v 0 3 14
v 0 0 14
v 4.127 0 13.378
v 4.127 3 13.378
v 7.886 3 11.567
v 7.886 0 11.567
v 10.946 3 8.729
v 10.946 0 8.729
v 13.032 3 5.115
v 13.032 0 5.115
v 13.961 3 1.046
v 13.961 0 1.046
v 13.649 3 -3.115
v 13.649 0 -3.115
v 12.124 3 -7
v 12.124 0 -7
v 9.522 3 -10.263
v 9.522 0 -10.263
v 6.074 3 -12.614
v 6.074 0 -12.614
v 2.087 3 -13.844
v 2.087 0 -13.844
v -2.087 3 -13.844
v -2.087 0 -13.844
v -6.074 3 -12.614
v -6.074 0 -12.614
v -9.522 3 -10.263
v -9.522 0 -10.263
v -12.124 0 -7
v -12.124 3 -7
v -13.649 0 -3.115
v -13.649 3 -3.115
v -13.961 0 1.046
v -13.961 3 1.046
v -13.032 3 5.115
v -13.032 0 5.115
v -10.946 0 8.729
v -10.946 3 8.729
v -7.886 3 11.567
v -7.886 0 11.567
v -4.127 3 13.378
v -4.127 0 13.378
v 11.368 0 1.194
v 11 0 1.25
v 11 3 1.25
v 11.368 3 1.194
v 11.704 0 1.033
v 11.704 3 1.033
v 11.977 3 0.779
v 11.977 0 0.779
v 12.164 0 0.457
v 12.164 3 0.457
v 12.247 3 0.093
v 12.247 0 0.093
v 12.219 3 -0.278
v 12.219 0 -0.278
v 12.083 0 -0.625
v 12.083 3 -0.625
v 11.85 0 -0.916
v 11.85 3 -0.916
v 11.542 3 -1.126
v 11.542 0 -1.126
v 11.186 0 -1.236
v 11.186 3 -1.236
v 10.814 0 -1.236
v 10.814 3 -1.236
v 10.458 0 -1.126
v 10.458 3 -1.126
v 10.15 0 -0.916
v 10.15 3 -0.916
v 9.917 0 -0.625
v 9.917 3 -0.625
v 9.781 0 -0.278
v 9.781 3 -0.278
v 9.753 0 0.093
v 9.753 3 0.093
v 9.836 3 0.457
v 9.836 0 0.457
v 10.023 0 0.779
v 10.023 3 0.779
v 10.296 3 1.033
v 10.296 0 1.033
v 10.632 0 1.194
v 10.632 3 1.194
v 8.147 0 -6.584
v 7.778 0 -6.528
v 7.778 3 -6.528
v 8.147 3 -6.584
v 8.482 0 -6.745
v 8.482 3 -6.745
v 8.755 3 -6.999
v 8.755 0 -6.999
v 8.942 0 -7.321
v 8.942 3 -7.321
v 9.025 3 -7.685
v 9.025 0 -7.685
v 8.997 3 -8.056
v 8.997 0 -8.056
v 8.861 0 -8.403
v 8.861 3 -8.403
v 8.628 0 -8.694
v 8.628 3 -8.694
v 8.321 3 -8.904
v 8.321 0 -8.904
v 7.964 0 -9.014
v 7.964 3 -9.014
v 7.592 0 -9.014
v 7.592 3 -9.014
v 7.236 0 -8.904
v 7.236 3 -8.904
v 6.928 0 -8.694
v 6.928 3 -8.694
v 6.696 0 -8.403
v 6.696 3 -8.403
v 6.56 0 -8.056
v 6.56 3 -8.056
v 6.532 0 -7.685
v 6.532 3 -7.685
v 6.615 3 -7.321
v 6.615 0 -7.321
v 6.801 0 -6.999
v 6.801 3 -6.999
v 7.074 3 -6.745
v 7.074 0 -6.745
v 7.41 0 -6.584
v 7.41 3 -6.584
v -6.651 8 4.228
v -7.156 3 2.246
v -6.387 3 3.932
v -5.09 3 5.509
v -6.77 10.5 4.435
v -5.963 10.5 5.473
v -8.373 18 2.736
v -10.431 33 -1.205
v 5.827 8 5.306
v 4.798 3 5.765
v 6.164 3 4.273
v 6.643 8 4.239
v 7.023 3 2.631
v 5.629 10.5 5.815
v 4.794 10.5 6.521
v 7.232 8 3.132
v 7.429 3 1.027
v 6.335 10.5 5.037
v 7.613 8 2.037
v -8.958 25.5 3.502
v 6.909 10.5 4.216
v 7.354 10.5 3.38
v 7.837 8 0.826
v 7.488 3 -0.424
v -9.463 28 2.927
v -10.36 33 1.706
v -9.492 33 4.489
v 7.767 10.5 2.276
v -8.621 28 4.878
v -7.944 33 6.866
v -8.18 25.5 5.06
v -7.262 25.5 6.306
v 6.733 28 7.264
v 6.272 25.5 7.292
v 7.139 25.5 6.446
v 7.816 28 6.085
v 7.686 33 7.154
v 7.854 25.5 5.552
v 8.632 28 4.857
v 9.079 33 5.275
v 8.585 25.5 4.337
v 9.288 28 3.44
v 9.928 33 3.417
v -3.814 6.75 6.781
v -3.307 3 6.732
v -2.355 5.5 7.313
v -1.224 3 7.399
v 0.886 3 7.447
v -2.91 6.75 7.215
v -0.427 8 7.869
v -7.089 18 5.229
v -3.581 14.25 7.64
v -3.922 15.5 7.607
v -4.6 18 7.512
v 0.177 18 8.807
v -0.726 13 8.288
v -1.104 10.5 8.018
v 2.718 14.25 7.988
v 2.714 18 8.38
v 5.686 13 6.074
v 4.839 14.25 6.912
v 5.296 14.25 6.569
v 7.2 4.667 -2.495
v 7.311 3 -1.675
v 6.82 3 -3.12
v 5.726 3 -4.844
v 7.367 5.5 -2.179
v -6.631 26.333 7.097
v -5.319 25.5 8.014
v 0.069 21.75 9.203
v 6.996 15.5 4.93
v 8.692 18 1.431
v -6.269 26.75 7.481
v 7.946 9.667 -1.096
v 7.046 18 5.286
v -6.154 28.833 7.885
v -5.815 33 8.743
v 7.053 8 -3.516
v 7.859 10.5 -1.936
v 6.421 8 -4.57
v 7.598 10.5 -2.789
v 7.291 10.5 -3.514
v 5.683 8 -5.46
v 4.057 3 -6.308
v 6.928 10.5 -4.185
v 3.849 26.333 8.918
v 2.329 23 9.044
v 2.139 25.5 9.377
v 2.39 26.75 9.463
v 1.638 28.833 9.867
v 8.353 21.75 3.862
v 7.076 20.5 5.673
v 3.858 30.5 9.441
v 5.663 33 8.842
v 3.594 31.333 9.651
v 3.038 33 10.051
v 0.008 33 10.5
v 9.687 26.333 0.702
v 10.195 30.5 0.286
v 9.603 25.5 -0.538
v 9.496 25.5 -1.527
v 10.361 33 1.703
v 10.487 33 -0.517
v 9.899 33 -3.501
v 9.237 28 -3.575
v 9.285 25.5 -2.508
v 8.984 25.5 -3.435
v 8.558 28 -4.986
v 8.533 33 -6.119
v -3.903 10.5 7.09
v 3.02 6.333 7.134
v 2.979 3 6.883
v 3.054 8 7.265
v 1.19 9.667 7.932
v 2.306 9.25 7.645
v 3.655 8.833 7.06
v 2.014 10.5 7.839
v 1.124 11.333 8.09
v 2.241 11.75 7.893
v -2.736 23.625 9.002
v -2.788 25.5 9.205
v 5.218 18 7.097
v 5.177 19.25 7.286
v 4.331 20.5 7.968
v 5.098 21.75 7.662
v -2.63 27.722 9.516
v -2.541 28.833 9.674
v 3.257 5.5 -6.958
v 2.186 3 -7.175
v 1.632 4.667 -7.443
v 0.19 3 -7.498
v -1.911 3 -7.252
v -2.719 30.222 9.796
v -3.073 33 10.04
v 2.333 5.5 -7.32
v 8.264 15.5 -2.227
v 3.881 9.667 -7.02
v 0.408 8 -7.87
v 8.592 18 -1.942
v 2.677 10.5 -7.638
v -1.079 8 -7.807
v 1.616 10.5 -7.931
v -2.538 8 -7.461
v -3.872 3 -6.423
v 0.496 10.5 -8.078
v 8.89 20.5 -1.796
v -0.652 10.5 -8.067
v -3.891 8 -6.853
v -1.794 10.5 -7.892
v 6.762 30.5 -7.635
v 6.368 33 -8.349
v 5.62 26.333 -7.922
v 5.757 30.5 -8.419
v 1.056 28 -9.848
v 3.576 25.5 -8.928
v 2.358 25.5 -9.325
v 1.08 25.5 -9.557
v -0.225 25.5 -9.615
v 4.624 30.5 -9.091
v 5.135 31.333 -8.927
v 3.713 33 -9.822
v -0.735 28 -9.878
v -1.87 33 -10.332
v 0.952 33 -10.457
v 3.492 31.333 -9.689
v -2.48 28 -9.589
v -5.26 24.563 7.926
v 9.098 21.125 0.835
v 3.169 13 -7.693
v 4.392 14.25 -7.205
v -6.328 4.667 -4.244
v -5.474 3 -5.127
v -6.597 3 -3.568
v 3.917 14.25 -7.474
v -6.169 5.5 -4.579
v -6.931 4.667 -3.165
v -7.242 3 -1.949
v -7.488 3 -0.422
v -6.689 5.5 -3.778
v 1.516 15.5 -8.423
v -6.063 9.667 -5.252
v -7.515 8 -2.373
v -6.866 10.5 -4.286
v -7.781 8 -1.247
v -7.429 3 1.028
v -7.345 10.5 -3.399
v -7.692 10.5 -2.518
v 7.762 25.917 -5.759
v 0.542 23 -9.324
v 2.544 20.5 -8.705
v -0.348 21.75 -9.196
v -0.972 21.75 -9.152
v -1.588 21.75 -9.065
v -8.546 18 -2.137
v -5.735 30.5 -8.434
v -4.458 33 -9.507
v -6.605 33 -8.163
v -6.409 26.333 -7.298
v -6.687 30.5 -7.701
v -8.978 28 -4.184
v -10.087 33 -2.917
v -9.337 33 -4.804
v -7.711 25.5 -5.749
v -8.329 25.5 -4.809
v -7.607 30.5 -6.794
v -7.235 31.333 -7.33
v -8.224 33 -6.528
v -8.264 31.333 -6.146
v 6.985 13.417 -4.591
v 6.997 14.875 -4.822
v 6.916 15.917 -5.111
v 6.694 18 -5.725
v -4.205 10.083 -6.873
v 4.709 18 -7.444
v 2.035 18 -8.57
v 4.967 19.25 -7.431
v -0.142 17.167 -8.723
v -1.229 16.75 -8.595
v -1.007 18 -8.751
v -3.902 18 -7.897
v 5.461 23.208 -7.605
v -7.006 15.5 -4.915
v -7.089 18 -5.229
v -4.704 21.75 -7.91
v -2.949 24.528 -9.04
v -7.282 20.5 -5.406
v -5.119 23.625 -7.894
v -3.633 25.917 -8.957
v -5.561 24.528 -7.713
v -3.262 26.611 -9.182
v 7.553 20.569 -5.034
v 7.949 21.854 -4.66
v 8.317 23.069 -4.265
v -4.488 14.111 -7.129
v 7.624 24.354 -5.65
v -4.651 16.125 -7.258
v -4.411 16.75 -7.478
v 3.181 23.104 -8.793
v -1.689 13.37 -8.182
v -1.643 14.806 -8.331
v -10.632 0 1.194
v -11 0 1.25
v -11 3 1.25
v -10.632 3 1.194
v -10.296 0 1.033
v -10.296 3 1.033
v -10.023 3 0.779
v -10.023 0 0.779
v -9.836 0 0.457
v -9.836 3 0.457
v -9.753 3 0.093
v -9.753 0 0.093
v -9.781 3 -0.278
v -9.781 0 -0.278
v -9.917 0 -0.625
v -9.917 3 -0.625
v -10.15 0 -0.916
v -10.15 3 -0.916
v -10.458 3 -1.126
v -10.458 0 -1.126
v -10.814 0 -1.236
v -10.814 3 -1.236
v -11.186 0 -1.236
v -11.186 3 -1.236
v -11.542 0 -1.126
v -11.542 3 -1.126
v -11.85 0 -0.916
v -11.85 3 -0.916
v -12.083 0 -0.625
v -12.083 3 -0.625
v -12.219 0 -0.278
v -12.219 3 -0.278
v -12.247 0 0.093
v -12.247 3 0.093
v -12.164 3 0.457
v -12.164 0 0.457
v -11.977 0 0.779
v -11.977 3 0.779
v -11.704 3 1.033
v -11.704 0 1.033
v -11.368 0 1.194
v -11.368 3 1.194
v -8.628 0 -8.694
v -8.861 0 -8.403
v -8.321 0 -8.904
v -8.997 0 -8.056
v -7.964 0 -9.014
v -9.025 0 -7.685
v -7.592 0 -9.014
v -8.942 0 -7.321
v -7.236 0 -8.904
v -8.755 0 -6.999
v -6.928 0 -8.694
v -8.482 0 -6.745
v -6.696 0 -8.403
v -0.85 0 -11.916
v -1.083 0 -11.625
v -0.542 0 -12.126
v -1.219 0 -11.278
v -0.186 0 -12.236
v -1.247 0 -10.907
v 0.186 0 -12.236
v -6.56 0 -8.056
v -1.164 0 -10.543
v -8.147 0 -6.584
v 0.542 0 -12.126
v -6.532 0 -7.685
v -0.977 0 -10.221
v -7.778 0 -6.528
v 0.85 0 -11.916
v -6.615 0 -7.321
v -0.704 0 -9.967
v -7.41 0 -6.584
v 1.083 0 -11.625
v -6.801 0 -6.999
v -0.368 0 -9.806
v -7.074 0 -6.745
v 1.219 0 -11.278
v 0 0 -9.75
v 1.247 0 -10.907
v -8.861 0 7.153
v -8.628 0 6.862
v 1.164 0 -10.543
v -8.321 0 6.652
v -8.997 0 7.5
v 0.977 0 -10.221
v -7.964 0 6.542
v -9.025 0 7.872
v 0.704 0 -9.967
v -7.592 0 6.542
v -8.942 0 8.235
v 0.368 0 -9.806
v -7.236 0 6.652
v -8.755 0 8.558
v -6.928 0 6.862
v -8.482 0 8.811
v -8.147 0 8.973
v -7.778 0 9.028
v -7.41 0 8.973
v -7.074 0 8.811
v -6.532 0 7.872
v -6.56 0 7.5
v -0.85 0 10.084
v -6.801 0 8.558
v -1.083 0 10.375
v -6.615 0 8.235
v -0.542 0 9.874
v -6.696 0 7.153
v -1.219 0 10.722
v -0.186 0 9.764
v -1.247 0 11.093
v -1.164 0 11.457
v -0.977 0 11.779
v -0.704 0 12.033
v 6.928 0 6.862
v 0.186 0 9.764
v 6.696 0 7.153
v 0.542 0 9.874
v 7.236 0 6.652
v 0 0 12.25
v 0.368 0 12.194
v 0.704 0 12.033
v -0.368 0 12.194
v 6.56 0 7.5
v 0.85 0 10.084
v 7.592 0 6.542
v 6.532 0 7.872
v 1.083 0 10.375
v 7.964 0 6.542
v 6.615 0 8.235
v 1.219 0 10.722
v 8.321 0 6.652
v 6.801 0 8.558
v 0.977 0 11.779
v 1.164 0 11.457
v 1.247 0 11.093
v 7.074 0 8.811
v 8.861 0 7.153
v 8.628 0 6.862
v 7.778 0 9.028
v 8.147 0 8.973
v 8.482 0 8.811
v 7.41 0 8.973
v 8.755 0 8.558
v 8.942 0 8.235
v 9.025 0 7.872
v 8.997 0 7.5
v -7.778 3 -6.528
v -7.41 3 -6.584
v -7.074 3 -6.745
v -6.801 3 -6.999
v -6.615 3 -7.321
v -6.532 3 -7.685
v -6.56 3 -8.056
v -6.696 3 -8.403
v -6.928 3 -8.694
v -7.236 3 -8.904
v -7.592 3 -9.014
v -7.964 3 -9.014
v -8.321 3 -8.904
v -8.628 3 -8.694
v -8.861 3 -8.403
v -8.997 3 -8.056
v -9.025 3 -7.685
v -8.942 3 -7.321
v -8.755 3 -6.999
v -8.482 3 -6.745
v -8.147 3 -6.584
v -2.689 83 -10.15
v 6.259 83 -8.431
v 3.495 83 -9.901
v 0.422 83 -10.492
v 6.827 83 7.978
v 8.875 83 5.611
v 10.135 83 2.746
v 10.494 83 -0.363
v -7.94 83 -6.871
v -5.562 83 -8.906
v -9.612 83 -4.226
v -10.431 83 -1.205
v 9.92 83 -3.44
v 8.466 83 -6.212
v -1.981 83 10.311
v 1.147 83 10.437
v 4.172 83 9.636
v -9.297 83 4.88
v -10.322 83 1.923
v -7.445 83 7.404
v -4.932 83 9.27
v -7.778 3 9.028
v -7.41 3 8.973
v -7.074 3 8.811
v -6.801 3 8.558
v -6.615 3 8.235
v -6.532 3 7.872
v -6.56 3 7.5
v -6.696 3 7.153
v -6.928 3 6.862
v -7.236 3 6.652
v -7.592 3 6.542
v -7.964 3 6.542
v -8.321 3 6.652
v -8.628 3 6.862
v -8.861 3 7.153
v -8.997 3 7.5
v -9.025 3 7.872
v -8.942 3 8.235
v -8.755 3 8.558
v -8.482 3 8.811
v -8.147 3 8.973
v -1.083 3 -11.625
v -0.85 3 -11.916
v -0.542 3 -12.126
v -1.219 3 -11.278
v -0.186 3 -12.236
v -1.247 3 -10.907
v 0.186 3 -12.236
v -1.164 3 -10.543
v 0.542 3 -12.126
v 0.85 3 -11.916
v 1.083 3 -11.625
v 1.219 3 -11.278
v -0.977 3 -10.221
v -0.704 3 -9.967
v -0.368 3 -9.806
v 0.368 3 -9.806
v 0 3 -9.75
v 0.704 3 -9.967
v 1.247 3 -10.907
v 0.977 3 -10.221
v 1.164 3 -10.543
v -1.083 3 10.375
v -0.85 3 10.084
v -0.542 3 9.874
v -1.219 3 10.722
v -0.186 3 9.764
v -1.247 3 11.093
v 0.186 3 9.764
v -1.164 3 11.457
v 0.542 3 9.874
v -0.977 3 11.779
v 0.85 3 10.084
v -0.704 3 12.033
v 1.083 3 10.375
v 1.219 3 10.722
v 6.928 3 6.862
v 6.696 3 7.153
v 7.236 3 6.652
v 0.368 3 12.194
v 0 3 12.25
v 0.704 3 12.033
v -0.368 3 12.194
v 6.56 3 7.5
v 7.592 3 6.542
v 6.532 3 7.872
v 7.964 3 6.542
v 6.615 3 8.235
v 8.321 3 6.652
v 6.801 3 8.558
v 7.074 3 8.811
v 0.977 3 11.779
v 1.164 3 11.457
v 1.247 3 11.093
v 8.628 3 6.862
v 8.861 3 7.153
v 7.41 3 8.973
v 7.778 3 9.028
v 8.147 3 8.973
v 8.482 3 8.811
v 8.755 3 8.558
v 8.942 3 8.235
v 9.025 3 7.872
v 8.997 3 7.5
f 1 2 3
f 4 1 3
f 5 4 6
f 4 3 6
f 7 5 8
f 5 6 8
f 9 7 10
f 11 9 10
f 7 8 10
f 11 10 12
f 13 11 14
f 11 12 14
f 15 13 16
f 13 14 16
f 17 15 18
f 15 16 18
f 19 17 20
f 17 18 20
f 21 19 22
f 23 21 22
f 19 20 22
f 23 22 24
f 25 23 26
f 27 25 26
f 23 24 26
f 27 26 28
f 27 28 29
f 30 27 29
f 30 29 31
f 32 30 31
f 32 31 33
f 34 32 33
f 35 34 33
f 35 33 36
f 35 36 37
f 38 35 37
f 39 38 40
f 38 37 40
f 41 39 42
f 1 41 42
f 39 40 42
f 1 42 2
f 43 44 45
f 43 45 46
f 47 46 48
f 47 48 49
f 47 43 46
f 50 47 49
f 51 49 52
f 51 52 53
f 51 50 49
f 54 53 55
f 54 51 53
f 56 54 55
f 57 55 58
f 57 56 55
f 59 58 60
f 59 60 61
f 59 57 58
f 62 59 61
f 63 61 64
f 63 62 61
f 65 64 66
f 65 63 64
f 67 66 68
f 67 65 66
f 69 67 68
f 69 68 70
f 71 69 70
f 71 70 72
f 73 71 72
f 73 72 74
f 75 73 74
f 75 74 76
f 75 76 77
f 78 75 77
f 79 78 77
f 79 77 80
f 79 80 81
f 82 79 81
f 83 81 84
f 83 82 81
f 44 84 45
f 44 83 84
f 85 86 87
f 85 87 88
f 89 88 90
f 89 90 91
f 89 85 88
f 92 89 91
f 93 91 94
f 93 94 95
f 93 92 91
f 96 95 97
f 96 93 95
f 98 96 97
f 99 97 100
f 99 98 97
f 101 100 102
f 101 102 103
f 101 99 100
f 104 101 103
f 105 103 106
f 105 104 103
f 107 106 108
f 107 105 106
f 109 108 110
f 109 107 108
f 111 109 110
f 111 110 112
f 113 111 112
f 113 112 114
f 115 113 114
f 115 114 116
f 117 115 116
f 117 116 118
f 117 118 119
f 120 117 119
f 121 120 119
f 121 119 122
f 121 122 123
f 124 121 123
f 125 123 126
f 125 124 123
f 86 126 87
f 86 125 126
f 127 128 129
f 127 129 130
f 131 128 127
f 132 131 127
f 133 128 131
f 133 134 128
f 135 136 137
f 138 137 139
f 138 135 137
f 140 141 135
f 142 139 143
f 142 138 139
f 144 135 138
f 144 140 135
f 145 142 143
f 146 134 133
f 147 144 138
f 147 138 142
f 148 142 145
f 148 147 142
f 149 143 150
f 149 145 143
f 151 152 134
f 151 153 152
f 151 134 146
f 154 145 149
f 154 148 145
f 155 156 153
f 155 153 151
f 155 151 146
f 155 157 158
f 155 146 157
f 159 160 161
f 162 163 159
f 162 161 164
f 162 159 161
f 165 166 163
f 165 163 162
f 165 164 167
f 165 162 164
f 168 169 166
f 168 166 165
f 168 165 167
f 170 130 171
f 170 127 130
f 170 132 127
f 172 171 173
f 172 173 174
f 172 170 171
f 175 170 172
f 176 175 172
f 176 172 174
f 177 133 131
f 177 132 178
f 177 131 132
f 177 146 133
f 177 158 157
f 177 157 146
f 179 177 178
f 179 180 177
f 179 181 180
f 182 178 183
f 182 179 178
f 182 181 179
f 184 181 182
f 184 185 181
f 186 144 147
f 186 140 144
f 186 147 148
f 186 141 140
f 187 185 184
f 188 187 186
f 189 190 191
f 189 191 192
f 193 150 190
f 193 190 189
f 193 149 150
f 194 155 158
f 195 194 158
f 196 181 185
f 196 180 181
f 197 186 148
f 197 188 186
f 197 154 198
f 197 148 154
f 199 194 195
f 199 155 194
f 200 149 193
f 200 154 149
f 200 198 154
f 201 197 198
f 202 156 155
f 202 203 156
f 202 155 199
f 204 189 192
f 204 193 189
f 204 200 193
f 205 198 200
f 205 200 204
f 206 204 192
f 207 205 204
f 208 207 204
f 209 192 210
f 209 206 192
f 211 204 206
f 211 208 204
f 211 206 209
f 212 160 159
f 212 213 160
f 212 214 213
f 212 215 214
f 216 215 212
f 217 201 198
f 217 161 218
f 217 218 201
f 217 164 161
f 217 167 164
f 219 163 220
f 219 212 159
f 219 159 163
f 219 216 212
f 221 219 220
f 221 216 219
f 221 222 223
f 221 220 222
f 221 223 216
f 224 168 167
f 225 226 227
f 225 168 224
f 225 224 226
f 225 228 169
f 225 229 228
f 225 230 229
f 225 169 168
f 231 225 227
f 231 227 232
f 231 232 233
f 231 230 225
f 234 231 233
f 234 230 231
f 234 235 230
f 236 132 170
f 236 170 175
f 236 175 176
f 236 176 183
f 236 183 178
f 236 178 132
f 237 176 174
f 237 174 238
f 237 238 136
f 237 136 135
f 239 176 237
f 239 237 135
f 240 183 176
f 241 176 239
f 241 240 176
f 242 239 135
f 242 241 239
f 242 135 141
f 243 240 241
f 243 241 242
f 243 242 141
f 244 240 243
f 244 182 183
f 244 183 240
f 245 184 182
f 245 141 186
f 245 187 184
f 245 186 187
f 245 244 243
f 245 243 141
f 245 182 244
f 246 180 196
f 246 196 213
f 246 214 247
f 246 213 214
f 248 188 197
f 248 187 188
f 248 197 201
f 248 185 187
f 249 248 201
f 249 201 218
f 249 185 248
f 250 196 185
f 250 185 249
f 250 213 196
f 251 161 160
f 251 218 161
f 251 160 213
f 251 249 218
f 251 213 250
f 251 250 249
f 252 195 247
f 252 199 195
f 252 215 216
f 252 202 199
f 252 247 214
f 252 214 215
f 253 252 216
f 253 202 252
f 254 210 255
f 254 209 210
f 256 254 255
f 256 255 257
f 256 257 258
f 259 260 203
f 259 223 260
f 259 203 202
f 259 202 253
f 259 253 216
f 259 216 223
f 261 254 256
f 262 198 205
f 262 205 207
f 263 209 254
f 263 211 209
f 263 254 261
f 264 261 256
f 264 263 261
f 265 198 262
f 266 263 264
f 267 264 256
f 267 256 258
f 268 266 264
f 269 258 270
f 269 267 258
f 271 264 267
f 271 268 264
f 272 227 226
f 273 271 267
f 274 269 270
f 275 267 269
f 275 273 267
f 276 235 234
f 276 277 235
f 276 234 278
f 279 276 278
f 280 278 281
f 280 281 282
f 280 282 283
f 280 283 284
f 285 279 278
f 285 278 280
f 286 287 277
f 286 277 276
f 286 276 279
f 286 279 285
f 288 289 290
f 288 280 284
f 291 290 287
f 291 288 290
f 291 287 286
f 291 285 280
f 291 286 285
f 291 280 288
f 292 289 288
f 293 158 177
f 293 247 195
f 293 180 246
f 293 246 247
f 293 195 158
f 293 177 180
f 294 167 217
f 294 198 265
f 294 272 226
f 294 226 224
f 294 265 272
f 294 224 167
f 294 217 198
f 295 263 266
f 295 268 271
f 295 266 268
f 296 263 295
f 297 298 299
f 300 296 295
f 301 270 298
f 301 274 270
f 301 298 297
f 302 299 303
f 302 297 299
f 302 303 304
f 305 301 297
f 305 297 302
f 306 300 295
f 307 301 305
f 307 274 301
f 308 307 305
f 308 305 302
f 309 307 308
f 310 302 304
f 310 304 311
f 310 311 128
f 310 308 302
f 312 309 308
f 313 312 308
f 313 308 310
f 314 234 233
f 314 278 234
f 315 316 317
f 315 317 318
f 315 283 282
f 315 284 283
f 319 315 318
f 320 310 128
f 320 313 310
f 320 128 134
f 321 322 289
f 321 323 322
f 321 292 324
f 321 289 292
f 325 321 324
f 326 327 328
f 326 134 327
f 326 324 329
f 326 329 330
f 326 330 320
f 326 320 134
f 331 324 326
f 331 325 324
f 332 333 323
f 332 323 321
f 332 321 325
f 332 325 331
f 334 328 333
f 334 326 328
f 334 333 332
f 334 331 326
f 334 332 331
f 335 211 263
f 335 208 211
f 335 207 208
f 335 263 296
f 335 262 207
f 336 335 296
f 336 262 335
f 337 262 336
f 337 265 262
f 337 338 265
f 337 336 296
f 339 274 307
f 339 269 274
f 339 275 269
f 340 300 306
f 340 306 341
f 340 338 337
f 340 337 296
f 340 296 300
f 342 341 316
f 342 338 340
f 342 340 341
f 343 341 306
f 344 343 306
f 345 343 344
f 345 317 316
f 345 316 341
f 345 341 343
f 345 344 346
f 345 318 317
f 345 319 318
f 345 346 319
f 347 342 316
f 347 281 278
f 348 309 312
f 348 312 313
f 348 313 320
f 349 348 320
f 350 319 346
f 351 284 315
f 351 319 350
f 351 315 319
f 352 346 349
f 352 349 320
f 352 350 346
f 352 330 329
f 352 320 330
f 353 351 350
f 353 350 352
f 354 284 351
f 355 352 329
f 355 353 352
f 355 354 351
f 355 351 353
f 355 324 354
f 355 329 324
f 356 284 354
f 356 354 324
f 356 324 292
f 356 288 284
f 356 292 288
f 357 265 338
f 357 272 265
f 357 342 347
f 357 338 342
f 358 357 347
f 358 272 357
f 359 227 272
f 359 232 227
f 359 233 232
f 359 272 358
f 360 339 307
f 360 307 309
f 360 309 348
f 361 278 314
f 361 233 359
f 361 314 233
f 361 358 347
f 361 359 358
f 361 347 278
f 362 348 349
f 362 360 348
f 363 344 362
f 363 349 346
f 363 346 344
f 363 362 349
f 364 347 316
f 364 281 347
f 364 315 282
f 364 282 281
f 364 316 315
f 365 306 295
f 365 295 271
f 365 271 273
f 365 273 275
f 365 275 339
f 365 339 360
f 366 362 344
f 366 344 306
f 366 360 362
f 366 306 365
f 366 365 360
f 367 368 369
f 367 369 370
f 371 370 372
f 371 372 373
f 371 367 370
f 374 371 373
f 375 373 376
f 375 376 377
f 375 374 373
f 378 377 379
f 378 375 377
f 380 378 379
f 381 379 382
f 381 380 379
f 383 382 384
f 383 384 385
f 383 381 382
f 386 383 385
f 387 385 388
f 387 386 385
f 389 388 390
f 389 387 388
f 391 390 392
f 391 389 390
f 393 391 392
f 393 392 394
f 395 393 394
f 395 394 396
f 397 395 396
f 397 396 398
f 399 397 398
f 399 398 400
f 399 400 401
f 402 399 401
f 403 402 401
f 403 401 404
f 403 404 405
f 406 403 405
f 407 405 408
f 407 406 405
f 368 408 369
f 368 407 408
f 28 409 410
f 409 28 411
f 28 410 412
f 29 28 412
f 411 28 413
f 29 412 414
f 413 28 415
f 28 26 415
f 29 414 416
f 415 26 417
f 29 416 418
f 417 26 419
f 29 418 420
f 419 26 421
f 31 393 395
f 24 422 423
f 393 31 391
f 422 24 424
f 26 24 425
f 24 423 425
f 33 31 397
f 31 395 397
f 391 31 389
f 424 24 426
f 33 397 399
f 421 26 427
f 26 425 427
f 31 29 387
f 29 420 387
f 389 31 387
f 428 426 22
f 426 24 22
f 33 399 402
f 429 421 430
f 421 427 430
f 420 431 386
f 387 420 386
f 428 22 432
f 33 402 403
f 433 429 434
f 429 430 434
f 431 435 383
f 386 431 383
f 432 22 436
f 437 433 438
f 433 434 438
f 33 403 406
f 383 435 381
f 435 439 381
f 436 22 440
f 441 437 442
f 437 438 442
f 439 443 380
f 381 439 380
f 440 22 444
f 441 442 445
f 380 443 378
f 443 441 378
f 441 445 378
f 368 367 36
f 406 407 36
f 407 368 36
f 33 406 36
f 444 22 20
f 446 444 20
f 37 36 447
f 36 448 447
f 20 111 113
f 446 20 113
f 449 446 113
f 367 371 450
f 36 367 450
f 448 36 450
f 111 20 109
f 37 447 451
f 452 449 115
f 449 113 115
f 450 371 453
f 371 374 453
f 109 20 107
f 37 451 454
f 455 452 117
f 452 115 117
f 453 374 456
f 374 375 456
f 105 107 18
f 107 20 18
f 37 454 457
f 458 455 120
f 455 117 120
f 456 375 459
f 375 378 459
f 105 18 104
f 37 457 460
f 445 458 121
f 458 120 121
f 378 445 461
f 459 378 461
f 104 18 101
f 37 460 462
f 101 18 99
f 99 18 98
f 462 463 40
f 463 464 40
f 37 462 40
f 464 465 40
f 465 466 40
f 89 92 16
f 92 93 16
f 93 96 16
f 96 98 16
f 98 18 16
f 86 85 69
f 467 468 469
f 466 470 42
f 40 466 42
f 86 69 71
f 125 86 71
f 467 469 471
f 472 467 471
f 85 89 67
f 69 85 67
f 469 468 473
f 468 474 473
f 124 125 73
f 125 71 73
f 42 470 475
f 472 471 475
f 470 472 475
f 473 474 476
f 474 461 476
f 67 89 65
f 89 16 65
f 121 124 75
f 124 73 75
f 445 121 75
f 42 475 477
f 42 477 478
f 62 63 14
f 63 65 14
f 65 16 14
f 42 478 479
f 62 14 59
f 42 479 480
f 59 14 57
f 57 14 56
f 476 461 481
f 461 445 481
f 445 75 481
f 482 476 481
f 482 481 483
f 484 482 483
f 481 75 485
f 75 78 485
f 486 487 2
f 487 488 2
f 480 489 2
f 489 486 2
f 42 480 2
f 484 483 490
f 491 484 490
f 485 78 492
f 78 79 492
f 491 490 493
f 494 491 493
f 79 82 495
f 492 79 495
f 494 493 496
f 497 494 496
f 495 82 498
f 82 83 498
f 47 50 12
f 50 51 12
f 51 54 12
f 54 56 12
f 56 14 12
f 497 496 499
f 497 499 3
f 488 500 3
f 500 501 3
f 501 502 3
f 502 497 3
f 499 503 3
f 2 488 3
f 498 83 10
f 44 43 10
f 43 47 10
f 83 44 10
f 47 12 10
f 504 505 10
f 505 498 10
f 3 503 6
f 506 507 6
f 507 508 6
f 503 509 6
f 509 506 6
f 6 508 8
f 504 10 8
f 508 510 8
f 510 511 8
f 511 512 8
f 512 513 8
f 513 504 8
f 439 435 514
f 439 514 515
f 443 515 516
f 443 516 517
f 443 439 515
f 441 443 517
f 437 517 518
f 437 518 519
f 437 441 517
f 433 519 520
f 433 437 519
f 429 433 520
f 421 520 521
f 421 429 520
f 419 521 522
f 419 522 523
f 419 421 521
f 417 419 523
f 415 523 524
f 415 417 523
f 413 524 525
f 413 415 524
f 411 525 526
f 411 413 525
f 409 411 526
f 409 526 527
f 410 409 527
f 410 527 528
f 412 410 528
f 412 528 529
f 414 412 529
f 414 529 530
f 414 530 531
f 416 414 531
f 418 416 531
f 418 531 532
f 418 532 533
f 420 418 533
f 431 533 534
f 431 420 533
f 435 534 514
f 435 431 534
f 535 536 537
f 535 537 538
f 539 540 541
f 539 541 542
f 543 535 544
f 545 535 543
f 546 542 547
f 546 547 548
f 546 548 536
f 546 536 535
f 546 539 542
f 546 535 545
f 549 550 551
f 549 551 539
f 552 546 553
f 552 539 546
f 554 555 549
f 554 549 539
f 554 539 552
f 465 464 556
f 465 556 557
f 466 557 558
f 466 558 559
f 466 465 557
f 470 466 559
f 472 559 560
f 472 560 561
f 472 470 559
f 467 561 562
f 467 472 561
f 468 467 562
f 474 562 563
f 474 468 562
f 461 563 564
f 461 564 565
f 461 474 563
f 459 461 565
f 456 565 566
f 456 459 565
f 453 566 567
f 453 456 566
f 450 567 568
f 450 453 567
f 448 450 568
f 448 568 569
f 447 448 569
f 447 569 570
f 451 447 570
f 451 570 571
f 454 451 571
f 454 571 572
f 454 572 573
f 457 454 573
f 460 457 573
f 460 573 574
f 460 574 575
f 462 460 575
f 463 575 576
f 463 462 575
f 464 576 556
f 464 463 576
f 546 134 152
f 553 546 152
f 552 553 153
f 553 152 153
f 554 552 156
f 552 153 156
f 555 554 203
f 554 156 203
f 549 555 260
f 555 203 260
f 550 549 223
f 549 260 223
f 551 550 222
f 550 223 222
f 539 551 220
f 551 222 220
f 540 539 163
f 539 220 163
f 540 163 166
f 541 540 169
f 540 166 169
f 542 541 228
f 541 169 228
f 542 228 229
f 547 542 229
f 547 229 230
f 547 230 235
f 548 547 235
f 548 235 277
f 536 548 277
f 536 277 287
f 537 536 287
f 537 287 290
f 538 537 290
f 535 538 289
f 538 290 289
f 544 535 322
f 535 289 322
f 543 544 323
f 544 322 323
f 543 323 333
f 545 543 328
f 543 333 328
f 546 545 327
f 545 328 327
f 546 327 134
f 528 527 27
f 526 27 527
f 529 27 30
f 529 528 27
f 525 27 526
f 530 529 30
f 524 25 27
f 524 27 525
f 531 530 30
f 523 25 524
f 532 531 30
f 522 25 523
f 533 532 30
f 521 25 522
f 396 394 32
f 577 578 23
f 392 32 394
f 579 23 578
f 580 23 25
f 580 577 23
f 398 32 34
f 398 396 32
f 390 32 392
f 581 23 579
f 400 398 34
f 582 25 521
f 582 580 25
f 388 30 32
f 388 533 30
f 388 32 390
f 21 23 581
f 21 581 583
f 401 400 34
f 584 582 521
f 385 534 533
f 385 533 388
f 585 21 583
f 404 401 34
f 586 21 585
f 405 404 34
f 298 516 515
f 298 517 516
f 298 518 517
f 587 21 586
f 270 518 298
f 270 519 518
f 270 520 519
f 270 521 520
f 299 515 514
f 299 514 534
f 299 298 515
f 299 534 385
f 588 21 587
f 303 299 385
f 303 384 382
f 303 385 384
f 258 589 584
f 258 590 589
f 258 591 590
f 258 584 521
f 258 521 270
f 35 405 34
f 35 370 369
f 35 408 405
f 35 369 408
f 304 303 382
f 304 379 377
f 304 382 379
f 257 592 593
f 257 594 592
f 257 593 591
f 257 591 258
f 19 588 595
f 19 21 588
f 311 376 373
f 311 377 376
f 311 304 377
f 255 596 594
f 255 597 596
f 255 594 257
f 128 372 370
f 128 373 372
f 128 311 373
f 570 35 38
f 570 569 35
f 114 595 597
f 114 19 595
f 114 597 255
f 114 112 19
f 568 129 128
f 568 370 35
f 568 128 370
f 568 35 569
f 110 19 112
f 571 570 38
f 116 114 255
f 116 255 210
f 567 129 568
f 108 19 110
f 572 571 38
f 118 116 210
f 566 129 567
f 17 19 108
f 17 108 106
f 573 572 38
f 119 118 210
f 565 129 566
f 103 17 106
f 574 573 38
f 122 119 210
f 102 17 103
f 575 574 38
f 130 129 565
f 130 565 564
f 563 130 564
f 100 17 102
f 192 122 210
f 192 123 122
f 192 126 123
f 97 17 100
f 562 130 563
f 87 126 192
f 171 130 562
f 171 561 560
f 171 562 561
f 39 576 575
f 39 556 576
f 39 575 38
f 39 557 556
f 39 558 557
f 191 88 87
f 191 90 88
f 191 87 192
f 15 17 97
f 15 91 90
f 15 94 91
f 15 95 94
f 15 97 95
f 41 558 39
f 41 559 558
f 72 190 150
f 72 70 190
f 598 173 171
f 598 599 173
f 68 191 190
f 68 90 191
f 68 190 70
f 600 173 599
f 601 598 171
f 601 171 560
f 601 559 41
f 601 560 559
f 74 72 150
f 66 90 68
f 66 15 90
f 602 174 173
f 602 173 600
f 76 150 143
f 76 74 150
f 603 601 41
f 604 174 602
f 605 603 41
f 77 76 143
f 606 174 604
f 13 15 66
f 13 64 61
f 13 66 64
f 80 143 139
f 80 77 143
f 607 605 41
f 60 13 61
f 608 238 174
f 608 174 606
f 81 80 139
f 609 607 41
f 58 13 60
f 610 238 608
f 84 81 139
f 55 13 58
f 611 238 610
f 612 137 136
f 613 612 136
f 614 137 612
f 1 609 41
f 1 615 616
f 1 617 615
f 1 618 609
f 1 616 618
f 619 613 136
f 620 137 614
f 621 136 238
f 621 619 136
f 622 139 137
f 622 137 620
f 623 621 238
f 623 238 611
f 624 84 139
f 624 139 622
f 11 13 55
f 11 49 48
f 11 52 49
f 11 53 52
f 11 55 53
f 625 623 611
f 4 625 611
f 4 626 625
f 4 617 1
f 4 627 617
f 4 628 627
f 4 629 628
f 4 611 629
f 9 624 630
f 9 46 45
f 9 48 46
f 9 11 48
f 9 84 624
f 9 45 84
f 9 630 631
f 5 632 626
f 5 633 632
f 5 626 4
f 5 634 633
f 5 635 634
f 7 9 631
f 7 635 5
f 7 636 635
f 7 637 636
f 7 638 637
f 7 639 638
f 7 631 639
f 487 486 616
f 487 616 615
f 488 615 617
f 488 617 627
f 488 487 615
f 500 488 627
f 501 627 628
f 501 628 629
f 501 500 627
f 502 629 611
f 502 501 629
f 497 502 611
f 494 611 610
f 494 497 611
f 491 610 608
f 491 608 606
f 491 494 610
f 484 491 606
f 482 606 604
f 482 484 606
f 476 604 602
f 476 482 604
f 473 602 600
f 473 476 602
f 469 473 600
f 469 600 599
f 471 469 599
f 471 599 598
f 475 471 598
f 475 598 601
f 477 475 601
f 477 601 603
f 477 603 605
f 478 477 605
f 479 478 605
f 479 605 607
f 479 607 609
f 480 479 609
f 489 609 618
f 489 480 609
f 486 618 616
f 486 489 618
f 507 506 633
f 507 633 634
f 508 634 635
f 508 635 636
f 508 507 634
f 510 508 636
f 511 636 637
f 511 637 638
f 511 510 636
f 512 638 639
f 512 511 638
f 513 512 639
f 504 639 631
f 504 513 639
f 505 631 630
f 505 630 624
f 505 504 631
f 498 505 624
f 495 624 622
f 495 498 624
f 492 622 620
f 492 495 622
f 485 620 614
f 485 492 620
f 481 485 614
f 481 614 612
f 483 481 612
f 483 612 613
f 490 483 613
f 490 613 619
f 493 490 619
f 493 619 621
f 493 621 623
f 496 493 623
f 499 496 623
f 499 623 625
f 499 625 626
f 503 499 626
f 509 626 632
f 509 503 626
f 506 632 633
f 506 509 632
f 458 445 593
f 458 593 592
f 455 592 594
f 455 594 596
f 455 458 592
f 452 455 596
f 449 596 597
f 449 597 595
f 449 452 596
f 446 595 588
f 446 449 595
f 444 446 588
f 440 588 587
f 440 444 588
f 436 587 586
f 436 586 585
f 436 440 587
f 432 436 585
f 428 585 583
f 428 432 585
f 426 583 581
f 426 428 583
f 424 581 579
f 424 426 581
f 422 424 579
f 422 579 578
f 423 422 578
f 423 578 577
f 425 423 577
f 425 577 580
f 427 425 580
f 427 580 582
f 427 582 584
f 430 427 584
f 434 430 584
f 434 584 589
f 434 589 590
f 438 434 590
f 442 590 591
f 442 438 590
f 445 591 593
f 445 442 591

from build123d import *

# Parameters (mm, degrees)
ESBO_O1_R                = 14
ESBO_O1_R_2              = 1.25
RESSALTO_EXTRUS_O1_DEPTH = 3
ESBO_O4_R                = 10.5
RESSALTO_EXTRUS_O3_DEPTH = 50


with BuildPart() as part:
    # Esboço1 → Ressalto-extrusão1 (new body)
    with BuildSketch(Plane(origin=(0, 0, 0), x_dir=(1, 0, 0), z_dir=(0, 1, 0))):
        with Locations(Location((0, 0, 0), (0, 0, 270))):
            Circle(ESBO_O1_R)
        with Locations(Location((0, 11, 0), (0, 0, 270))):
            Circle(ESBO_O1_R_2, mode=Mode.SUBTRACT)
        with Locations(Location((7.778174593, 7.778174593, 0), (0, 0, 270))):
            Circle(ESBO_O1_R_2, mode=Mode.SUBTRACT)
        with Locations(Location((11, 0, 0), (0, 0, 270))):
            Circle(ESBO_O1_R_2, mode=Mode.SUBTRACT)
        with Locations(Location((7.778174593, -7.778174593, 0), (0, 0, 270))):
            Circle(ESBO_O1_R_2, mode=Mode.SUBTRACT)
        with Locations(Location((0, -11, 0), (0, 0, 270))):
            Circle(ESBO_O1_R_2, mode=Mode.SUBTRACT)
        with Locations(Location((-7.778174593, -7.778174593, 0), (0, 0, 270))):
            Circle(ESBO_O1_R_2, mode=Mode.SUBTRACT)
        with Locations(Location((-11, 0, 0), (0, 0, 270))):
            Circle(ESBO_O1_R_2, mode=Mode.SUBTRACT)
        with Locations(Location((-7.778174593, 7.778174593, 0), (0, 0, 270))):
            Circle(ESBO_O1_R_2, mode=Mode.SUBTRACT)
    extrude(amount=RESSALTO_EXTRUS_O1_DEPTH)

    # Loft1: read off the stored shape, not the designer's step
    # Loft1: loft between two sections, ruled curve by curve
    loft1_from = [
        Edge.make_bspline([(-7.155862372, 3, 2.245803579), (-2.664255213, 3, 16.557528323), (11.647469531, 3, 12.065921164), (7.155862372, 3, -2.245803579), (2.664255213, 3, -16.557528323), (-11.647469531, 3, -12.065921164), (-7.155862372, 3, 2.245803579)], [0, 0, 0, 0, 0.5, 0.5, 0.5, 1, 1, 1, 1], 3, [1, 0.333333333, 0.333333333, 1, 0.333333333, 0.333333333, 1]),
    ]
    loft1_to = [
        Edge.make_bspline([(-10.43066657, 33, -1.204655513), (-12.839977596, 33, 19.656677627), (8.021355544, 33, 22.065988653), (10.43066657, 33, 1.204655513), (12.839977596, 33, -19.656677627), (-8.021355544, 33, -22.065988653), (-10.43066657, 33, -1.204655513)], [0, 0, 0, 0, 0.5, 0.5, 0.5, 1, 1, 1, 1], 3, [1, 0.333333333, 0.333333333, 1, 0.333333333, 0.333333333, 1]),
    ]
    loft1 = Solid(Shell([*[Face.make_surface_from_curves(loft1_from[k], loft1_to[k]) for k in range(1)], Face(Wire(loft1_from)), Face(Wire(loft1_to))]))
    add(loft1)

    # Esboço4 → Ressalto-extrusão3 (add)
    with BuildSketch(Plane(origin=(0, 33, 0), x_dir=(1, 0, 0), z_dir=(0, 1, 0))):
        with Locations(Location((0, 0, 0), (0, 0, 173.412))):
            Circle(ESBO_O4_R)
    extrude(amount=RESSALTO_EXTRUS_O3_DEPTH)


solid = part.part
